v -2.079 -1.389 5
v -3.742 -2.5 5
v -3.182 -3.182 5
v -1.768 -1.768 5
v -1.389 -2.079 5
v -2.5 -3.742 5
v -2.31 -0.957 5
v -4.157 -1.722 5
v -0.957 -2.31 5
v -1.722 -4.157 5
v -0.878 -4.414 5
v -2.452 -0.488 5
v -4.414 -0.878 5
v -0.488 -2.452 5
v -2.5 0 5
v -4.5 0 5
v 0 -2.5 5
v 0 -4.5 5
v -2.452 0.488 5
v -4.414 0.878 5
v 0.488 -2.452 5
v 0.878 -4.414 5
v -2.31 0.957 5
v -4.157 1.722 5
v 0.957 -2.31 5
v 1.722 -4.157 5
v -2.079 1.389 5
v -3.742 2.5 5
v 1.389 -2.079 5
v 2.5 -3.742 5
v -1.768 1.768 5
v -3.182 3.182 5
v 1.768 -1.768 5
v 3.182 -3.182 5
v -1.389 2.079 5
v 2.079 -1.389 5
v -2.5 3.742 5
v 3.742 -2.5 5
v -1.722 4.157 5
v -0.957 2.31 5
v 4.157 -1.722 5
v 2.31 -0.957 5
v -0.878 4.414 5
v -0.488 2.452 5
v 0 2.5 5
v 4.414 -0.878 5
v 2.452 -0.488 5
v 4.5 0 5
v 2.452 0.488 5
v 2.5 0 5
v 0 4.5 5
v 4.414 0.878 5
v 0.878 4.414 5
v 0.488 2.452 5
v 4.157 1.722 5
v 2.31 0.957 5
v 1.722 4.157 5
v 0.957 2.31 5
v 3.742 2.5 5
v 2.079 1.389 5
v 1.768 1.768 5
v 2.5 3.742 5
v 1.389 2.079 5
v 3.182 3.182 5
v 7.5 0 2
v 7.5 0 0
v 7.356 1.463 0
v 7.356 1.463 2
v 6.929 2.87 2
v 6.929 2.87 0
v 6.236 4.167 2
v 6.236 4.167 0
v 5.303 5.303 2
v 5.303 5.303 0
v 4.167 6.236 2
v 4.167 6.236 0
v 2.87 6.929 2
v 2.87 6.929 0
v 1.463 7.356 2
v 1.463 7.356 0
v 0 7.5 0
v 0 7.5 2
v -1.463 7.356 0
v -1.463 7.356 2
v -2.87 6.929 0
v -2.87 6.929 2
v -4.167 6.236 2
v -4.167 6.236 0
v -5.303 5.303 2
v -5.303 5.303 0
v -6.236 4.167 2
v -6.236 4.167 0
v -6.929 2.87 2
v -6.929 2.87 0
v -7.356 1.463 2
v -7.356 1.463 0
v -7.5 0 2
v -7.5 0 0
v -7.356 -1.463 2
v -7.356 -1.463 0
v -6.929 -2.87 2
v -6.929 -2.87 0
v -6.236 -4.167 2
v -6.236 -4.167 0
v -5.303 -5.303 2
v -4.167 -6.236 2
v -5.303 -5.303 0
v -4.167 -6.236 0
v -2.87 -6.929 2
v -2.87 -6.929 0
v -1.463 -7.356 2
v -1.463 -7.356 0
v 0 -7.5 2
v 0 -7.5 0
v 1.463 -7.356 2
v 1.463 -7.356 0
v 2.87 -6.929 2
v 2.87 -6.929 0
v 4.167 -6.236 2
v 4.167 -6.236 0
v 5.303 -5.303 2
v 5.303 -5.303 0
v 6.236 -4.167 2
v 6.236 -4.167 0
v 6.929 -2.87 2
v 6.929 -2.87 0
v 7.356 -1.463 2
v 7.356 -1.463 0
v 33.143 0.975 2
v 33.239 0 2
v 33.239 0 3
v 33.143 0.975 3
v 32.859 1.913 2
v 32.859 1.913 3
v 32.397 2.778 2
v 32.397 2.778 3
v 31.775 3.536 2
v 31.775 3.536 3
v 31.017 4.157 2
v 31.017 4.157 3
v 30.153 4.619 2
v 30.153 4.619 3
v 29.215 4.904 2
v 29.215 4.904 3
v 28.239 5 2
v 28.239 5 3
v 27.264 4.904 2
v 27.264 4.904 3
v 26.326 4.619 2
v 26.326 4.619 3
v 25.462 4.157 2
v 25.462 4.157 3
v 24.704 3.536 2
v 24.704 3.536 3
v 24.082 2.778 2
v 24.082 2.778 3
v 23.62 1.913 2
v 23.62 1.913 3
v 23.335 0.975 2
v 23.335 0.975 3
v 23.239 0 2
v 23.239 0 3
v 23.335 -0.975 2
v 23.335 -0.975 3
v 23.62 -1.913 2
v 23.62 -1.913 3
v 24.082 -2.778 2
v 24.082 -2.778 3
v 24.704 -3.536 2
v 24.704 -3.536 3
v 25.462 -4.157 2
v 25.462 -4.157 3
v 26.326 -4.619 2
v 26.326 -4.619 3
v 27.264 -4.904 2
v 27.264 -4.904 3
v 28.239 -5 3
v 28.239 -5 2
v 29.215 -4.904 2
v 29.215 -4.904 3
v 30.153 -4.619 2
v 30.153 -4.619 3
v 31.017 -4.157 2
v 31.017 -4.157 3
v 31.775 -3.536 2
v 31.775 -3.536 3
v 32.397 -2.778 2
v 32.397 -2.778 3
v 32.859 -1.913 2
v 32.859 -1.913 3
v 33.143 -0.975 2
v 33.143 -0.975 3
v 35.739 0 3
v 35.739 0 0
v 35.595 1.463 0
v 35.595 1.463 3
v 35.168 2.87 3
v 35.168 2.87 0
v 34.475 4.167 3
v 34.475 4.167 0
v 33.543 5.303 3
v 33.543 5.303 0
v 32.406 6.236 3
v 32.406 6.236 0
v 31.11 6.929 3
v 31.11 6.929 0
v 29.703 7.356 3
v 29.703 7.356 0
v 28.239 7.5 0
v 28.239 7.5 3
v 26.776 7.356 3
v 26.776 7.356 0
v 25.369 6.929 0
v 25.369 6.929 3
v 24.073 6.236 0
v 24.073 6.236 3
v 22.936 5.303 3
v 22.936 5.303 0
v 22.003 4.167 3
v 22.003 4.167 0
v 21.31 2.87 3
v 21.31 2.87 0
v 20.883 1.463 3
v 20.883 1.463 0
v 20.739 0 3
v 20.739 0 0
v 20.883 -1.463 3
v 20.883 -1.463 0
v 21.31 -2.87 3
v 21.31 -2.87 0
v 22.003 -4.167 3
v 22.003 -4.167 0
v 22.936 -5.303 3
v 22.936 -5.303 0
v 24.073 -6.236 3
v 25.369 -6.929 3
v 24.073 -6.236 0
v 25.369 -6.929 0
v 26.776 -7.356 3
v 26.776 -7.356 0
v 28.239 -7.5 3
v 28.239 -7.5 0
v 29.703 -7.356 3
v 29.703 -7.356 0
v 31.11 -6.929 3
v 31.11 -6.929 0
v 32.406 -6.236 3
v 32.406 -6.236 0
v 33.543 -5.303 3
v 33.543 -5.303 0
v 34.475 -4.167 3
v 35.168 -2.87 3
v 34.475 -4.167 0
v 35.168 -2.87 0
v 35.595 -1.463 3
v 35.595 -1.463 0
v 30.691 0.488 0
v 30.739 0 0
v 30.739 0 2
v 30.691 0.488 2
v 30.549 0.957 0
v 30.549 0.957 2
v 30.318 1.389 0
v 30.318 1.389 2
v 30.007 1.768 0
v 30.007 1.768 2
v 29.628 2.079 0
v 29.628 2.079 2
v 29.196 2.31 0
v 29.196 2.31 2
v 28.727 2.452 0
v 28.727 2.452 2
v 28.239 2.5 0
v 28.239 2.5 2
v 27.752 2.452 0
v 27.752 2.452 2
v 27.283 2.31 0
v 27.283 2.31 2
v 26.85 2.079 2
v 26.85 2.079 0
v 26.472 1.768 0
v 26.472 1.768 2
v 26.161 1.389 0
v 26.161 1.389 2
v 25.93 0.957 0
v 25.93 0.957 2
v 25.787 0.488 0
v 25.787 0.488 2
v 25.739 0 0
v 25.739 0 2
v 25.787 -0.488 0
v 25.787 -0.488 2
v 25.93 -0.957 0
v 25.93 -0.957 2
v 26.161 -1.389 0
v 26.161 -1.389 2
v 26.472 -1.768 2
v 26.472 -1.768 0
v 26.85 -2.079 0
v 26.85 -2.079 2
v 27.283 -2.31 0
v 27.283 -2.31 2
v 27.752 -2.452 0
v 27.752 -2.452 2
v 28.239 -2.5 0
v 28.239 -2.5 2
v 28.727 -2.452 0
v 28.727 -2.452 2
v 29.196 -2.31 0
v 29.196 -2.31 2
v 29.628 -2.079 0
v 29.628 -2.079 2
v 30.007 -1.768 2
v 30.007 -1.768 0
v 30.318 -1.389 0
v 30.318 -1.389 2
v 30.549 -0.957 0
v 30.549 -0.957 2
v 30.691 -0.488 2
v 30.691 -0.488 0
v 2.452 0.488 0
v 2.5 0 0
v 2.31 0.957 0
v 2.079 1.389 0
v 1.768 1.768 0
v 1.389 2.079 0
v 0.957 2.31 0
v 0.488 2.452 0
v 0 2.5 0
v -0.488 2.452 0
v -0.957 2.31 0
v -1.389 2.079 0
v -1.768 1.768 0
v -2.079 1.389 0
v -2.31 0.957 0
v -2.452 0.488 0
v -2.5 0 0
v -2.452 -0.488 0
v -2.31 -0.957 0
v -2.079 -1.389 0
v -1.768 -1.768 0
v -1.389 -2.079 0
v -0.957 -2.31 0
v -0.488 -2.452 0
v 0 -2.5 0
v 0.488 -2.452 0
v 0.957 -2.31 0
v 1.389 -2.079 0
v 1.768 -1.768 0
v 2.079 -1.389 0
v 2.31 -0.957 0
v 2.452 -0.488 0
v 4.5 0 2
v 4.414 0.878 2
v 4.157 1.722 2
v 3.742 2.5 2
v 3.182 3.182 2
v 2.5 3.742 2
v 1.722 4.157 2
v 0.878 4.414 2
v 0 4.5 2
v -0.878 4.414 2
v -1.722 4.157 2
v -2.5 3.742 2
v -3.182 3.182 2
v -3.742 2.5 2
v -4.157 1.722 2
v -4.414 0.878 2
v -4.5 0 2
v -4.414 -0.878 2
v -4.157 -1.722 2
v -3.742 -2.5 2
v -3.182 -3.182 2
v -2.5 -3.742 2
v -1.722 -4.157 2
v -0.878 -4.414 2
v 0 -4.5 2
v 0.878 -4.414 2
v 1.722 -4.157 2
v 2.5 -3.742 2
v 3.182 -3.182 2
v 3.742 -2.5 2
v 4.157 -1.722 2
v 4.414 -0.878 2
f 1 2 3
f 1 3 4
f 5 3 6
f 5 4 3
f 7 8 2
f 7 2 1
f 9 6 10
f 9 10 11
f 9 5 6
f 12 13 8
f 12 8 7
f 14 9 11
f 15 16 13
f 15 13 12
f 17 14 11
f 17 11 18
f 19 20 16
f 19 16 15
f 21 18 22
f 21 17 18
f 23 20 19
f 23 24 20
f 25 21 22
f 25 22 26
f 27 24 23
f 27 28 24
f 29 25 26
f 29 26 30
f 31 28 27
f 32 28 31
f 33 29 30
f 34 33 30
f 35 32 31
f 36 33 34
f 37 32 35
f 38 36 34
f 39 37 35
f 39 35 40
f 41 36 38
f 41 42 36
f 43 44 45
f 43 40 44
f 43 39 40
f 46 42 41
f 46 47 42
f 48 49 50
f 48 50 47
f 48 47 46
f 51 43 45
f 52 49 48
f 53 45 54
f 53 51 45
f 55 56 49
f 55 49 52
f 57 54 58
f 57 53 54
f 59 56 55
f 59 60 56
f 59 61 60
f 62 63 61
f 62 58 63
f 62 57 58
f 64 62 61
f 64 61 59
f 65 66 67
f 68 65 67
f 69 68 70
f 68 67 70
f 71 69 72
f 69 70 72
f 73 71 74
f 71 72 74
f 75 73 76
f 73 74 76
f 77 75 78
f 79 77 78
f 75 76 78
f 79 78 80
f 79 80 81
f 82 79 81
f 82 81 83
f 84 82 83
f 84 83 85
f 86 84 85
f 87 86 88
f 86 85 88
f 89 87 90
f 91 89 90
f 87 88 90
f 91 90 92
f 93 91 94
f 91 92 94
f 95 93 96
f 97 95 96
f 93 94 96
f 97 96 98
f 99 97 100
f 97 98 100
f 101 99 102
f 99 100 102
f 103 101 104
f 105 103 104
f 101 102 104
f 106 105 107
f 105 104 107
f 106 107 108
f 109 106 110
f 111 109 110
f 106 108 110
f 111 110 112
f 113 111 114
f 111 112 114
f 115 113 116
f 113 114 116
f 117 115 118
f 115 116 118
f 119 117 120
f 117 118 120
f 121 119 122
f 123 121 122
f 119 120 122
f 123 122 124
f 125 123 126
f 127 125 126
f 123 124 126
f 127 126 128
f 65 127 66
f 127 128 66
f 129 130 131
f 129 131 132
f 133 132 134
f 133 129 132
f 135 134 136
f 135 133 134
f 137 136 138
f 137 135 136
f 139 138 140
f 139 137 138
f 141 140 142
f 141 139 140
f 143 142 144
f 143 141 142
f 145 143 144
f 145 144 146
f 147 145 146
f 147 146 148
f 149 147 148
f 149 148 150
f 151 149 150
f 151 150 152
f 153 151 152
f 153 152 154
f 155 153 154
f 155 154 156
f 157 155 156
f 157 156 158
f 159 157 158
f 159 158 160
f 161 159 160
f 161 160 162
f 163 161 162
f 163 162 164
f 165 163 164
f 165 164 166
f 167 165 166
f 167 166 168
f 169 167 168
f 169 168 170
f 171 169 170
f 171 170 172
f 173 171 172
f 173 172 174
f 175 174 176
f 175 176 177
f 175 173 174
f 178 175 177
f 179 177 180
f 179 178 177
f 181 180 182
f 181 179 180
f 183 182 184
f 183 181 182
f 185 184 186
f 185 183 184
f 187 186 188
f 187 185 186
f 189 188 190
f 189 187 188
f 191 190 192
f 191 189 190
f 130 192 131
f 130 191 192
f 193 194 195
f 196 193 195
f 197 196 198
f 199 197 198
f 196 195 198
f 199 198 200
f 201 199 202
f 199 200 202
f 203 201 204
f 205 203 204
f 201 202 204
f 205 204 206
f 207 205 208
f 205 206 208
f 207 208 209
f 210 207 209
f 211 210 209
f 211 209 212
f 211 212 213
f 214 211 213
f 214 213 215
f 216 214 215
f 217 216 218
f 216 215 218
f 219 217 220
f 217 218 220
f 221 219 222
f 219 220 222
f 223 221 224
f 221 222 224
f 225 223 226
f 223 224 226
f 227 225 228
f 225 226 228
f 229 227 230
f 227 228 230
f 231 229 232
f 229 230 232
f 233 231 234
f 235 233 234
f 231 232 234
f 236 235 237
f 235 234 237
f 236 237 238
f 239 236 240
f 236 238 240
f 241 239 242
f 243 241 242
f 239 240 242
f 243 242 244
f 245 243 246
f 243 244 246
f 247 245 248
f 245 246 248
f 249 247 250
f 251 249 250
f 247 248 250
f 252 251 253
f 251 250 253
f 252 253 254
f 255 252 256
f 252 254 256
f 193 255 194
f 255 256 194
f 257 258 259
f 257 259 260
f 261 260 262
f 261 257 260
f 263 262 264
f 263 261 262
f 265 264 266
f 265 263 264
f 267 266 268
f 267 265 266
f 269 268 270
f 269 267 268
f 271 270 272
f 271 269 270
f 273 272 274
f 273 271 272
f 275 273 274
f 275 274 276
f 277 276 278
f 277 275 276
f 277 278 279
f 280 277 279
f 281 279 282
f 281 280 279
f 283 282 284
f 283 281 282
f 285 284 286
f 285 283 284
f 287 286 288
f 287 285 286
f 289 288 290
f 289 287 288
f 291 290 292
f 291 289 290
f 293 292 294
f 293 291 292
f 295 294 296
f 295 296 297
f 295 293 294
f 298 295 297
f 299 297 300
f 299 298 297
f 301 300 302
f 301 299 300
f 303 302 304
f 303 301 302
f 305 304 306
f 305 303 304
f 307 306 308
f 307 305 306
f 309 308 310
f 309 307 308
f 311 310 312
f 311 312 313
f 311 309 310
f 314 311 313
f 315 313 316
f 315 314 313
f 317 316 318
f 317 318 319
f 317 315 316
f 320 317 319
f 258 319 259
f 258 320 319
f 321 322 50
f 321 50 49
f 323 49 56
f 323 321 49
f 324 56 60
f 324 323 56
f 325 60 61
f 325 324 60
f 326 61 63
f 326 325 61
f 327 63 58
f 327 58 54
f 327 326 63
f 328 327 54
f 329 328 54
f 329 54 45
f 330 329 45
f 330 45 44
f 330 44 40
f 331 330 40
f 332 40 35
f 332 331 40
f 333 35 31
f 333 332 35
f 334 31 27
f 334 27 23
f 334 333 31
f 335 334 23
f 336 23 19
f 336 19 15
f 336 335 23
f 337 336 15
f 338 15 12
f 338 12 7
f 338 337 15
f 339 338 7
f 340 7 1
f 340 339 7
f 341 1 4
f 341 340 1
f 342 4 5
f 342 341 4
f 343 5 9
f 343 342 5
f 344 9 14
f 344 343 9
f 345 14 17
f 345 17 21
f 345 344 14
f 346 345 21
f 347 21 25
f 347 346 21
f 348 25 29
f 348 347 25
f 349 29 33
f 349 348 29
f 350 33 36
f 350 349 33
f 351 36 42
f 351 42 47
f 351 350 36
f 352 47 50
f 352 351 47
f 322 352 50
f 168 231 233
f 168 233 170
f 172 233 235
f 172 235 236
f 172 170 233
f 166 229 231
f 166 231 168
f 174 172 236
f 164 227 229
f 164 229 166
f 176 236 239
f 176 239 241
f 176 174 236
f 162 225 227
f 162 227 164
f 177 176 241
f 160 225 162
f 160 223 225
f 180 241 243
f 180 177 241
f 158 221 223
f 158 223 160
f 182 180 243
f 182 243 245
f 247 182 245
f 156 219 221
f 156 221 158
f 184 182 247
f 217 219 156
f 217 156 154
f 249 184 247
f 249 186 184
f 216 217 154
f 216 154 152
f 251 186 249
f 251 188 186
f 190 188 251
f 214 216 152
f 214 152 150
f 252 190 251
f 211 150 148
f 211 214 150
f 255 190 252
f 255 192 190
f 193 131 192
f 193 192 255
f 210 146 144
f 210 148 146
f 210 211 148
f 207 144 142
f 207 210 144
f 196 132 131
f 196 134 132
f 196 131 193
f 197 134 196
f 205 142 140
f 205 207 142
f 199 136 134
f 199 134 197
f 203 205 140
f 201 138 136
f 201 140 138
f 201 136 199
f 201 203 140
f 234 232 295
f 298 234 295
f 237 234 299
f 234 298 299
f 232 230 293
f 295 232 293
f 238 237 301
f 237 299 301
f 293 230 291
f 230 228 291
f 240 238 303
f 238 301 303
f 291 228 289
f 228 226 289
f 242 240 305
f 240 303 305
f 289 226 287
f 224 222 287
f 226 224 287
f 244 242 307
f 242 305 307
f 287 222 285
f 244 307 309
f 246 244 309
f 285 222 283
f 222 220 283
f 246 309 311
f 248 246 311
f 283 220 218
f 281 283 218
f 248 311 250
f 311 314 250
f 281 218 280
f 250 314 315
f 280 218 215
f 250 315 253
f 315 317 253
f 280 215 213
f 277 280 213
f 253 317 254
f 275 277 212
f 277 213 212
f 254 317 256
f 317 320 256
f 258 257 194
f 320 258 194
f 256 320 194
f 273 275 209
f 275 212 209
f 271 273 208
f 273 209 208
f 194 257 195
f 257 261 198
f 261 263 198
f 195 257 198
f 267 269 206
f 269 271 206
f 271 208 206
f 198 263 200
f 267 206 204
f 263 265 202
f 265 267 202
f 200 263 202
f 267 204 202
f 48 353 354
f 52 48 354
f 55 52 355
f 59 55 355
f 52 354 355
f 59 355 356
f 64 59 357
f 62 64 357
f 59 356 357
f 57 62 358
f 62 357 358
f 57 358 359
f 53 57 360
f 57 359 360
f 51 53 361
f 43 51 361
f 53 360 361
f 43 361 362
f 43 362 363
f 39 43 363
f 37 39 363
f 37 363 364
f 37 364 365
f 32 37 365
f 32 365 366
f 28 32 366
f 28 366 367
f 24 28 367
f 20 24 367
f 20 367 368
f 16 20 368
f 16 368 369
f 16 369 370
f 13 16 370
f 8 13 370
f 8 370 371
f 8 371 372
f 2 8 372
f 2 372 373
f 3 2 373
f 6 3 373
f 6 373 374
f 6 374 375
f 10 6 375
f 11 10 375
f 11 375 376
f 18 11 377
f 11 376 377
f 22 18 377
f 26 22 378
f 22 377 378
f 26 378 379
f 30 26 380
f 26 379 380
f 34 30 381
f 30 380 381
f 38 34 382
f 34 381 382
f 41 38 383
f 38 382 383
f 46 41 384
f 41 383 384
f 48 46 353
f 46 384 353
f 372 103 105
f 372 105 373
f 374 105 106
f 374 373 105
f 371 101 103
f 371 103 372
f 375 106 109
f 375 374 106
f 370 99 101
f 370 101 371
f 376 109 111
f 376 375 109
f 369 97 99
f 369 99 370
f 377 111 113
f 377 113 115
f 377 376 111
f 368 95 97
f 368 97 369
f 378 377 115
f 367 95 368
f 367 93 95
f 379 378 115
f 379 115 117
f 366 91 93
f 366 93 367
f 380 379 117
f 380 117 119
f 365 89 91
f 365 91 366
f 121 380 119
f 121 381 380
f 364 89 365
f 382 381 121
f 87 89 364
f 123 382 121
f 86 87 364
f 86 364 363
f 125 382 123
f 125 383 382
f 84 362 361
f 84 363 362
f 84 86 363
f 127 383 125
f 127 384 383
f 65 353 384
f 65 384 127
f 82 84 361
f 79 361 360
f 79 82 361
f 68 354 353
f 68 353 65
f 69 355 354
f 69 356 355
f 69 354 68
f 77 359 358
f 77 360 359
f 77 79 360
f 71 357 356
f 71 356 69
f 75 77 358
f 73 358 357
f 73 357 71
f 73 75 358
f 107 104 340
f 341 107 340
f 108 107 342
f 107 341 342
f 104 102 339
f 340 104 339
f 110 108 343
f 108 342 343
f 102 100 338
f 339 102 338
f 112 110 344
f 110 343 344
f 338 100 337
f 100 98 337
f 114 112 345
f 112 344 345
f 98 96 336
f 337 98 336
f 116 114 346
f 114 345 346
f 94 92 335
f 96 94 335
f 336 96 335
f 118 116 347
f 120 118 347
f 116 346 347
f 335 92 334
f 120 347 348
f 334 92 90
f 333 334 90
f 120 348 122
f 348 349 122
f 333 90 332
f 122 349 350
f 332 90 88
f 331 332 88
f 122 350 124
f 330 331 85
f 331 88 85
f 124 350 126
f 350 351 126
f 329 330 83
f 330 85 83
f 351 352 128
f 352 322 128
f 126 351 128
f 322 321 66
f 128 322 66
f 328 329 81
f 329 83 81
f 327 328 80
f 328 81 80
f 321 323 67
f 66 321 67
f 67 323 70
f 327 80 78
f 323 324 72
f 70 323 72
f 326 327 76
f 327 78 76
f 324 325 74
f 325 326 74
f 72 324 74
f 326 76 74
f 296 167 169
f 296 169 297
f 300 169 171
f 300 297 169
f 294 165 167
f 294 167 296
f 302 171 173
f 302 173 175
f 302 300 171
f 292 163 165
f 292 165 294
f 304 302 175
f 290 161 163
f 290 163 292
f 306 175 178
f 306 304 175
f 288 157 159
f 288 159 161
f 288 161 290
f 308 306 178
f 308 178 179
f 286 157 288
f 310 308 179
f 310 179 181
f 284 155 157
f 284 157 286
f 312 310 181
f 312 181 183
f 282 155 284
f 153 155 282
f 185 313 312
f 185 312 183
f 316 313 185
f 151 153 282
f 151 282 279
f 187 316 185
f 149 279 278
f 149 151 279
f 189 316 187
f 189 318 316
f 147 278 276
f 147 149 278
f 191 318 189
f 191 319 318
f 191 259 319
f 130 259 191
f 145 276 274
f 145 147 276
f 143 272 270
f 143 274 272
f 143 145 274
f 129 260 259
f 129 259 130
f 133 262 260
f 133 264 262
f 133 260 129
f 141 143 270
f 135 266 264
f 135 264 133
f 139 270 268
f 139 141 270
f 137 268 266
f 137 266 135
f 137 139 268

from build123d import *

# Parameters (mm, degrees)
F0_R     = 5
F0_R_2   = 2.5
F1_DEPTH = 2
F0_R_3   = 7.5
F2_DEPTH = 3
F0_R_4   = 4.5
F3_DEPTH = 5
F4_DEPTH = 2


with BuildPart() as f1:
    # F0 (on Top) → F1 (new body)
    with BuildSketch(Plane.XY):
        with Locations((28.239377, 0)):
            Circle(F0_R)
        with Locations((28.239377, 0)):
            Circle(F0_R_2, mode=Mode.SUBTRACT)
    extrude(amount=F1_DEPTH)

    # F0 (on Top) → F2 (join)
    with BuildSketch(Plane.XY):
        with Locations((28.239377, 0)):
            Circle(F0_R_3)
        with Locations((28.239377, 0)):
            Circle(F0_R, mode=Mode.SUBTRACT)
    extrude(amount=F2_DEPTH)


with BuildPart() as f3:
    # F0 (on Top) → F3 (new body)
    with BuildSketch(Plane.XY):
        Circle(F0_R_4)
        Circle(F0_R_2, mode=Mode.SUBTRACT)
    extrude(amount=F3_DEPTH)

    # F0 (on Top) → F4 (join)
    with BuildSketch(Plane.XY):
        Circle(F0_R_3)
        Circle(F0_R_4, mode=Mode.SUBTRACT)
    extrude(amount=F4_DEPTH)


solid = Compound([f1.part, f3.part])
